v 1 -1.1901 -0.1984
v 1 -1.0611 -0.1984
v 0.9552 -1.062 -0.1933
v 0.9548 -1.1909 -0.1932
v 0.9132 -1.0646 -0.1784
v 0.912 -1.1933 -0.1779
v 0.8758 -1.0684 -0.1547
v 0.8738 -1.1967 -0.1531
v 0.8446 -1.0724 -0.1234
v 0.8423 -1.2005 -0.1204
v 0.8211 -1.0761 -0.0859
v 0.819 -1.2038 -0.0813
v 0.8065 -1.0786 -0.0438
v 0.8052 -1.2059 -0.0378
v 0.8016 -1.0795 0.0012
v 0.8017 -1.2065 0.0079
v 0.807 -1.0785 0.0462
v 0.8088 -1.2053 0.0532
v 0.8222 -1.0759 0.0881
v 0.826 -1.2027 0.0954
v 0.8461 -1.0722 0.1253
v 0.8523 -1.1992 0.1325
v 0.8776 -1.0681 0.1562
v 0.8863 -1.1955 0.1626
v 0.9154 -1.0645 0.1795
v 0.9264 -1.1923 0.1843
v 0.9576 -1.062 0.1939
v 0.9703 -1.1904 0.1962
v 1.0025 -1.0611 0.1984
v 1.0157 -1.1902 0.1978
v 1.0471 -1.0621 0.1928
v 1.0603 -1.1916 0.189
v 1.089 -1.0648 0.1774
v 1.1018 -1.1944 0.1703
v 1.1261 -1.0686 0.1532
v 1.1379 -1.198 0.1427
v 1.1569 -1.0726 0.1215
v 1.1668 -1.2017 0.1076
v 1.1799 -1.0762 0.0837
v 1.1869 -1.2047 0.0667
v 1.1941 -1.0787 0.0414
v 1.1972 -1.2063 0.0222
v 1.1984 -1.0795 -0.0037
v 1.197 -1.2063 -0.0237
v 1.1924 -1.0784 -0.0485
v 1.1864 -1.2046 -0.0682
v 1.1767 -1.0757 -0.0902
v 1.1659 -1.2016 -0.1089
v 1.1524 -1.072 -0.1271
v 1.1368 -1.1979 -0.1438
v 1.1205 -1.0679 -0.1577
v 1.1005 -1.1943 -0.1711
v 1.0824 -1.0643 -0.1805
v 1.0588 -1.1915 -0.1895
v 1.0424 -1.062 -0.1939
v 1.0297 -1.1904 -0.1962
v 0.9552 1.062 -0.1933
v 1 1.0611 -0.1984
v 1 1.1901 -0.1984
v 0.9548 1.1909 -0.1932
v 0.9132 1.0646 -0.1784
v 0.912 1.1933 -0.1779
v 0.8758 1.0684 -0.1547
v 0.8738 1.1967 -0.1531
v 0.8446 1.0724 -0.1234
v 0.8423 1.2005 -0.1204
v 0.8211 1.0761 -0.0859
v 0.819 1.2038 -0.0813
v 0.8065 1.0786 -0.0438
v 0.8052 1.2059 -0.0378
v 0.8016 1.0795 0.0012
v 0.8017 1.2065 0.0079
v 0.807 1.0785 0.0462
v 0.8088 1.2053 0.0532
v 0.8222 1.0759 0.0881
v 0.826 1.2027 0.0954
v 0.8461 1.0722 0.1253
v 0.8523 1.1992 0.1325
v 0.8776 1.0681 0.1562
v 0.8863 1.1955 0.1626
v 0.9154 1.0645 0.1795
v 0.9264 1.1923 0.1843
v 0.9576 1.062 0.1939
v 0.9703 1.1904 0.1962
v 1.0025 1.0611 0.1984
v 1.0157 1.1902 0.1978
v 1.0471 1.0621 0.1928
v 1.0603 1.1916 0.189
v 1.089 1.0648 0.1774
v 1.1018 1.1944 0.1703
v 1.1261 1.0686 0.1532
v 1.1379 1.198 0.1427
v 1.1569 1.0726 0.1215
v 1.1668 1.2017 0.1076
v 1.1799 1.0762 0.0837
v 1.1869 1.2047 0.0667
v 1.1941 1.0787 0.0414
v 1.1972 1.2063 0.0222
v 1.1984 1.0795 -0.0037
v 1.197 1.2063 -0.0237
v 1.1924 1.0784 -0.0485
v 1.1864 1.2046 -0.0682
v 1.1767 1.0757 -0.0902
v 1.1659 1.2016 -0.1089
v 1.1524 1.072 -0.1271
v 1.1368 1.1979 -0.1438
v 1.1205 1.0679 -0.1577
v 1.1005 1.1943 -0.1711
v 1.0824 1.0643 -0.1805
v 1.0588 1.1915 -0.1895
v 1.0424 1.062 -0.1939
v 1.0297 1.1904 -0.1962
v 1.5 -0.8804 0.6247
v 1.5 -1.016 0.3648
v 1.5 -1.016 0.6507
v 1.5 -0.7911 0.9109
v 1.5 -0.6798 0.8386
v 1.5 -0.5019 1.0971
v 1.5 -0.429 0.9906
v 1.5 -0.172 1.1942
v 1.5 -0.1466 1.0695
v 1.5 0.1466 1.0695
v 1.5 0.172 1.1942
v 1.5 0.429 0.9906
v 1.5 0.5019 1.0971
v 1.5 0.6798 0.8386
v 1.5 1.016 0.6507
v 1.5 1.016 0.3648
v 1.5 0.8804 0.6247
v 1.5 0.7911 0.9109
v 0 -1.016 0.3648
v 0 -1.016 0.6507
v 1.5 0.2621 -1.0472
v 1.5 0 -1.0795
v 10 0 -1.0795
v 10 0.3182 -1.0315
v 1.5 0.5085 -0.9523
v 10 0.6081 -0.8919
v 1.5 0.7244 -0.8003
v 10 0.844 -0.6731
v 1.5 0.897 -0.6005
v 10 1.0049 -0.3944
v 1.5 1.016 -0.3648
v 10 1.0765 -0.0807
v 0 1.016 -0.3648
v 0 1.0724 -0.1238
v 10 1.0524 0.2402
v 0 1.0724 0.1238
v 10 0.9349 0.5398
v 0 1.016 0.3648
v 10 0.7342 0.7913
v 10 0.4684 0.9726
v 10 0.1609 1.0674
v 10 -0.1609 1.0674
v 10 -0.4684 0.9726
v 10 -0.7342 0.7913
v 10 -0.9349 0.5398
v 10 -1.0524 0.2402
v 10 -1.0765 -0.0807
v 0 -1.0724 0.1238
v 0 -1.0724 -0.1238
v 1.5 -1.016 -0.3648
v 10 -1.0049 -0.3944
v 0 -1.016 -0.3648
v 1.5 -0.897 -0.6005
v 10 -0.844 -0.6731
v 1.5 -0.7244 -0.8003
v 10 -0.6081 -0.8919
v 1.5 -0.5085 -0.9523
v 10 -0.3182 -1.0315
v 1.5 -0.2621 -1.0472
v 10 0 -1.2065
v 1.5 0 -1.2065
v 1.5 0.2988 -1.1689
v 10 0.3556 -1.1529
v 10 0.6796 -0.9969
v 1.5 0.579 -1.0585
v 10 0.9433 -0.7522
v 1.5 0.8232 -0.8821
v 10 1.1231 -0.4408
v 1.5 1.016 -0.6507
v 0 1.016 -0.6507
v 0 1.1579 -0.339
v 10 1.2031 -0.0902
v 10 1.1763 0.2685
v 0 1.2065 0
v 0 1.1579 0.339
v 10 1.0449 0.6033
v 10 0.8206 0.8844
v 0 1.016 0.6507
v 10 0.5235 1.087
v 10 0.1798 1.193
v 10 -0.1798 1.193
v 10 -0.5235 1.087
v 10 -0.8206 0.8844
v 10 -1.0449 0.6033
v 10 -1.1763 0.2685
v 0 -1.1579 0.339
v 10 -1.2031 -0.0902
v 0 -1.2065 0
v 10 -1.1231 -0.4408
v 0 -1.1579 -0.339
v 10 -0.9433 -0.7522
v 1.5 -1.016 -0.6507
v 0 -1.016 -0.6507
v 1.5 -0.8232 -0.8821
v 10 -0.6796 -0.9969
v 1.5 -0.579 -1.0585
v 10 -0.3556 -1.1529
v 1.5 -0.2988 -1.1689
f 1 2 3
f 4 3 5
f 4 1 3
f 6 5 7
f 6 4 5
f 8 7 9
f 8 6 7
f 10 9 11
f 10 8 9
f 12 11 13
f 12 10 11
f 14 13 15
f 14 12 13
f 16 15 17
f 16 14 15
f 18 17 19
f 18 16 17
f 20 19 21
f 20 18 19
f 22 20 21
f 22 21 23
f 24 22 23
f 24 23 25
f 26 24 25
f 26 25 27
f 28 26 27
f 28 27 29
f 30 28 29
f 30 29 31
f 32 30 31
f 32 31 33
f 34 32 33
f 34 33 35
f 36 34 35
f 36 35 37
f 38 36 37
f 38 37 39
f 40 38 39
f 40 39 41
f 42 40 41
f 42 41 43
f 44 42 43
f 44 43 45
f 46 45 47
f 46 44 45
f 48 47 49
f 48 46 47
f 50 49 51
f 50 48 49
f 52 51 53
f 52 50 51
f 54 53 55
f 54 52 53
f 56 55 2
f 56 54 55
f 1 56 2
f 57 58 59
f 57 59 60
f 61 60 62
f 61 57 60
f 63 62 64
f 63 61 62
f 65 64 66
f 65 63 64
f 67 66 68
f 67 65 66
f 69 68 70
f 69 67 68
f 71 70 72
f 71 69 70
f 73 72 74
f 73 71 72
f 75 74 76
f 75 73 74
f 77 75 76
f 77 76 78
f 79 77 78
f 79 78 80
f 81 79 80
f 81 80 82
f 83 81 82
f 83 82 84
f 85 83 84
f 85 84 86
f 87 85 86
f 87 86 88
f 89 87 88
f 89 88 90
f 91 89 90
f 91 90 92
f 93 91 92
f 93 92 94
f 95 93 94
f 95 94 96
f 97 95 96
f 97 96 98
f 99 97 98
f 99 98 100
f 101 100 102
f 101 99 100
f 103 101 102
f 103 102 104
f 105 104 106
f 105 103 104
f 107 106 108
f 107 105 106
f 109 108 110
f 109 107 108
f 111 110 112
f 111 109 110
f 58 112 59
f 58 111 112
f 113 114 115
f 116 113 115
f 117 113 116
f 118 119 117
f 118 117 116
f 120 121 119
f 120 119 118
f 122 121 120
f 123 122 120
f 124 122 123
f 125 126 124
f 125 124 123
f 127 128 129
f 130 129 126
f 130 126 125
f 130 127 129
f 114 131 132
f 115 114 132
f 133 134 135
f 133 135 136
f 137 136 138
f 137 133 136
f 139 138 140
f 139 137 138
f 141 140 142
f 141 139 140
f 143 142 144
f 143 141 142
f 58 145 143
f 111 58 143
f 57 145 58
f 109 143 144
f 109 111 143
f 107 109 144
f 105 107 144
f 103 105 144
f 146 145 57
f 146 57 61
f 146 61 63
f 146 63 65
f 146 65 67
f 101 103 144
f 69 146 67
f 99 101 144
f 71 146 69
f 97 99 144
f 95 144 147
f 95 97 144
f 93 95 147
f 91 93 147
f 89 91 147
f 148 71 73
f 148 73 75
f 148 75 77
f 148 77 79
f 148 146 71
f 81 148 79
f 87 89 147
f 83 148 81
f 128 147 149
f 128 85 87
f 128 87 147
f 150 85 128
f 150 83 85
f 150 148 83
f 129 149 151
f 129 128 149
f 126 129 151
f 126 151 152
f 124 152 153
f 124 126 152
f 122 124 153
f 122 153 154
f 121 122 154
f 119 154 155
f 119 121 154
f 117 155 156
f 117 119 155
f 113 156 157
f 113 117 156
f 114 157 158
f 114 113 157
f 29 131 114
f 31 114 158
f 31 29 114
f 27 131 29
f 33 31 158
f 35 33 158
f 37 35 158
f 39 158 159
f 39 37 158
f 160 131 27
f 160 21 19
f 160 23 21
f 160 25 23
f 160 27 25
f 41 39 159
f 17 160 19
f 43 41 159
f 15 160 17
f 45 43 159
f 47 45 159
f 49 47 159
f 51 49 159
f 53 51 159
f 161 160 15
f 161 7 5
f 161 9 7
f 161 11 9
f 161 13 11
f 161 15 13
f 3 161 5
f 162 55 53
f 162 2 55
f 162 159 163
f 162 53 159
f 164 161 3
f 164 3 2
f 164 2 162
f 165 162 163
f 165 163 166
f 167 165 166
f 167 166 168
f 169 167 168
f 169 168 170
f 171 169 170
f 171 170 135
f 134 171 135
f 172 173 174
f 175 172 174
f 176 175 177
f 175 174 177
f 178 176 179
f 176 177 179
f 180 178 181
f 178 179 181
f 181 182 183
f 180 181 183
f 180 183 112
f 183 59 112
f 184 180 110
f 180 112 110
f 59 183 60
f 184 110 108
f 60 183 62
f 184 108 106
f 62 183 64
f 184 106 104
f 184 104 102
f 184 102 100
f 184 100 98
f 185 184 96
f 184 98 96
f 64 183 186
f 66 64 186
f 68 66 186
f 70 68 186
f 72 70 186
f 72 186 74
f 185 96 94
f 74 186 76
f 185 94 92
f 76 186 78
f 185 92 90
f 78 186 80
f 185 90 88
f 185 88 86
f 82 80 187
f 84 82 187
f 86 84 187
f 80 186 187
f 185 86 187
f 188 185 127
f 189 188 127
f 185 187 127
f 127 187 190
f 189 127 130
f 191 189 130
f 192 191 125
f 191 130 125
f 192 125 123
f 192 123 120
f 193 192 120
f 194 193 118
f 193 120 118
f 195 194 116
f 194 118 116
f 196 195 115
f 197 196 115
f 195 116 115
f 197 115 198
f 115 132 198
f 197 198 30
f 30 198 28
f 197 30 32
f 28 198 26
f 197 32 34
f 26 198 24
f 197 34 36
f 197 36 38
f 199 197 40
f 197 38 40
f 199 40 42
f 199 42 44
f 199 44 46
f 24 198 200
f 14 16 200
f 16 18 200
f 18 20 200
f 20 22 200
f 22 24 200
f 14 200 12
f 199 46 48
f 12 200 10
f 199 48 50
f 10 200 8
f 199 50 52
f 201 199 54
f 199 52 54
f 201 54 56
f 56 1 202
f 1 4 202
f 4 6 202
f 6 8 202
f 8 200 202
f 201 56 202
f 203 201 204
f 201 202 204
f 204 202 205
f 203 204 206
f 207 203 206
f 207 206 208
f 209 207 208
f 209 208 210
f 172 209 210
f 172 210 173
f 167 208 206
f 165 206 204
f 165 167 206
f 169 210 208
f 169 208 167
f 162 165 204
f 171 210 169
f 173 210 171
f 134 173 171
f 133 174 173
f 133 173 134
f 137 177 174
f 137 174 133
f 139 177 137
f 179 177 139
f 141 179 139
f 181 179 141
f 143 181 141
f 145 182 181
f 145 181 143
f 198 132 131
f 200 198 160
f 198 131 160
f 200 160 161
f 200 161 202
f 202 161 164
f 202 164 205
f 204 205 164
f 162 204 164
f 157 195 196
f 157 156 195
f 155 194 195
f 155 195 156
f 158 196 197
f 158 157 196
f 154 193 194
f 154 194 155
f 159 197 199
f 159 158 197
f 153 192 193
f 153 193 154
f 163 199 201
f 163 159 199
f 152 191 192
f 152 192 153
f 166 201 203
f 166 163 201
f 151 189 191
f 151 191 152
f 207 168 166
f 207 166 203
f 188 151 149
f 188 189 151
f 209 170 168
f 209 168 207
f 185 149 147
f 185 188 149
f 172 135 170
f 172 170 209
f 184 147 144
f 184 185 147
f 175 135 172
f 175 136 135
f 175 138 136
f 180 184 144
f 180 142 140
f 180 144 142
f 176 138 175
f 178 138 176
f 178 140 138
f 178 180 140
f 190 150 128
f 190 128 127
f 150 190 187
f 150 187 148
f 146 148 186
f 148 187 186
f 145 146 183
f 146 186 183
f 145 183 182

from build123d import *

# Parameters (mm, degrees)
SKETCH1_R               = 1.2065
SKETCH1_R_2             = 1.0795
BOSS_EXTRUDE1_DEPTH     = 10
SKETCH2_W               = 4.648816228
SKETCH2_H               = 2.032
CUT_EXTRUDE1_DEPTH      = 1.5
CUT_EXTRUDE2_DEPTH      = 5
CUT_EXTRUDE2_DEPTH_BACK = 5
SKETCH4_R               = 0.1984375


with BuildPart() as part:
    # Sketch1 → Boss-Extrude1 (new body)
    with BuildSketch(Plane(origin=(0, 0, 0), x_dir=(0, 0, -1), z_dir=(1, 0, 0))):
        Circle(SKETCH1_R)
        Circle(SKETCH1_R_2, mode=Mode.SUBTRACT)
    extrude(amount=BOSS_EXTRUDE1_DEPTH)

    # Sketch2 → Cut-Extrude1 (cut)
    with BuildSketch(Plane.ZY):
        with Locations((0.126795446, 0)):
            Rectangle(SKETCH2_W, SKETCH2_H)
    extrude(amount=-CUT_EXTRUDE1_DEPTH, mode=Mode.SUBTRACT)

    # Sketch4 → Cut-Extrude2 (cut, two sides: drawn at the far end of the back side and taken through both)
    with BuildSketch(Plane(origin=(0, 0, 0), x_dir=(1, 0, 0), z_dir=(0, 1, 0)).offset(-CUT_EXTRUDE2_DEPTH_BACK)):
        with Locations(Location((1, 0, 0), (0, 0, 90))):
            Circle(SKETCH4_R)
    extrude(amount=CUT_EXTRUDE2_DEPTH + CUT_EXTRUDE2_DEPTH_BACK, mode=Mode.SUBTRACT)


solid = part.part
